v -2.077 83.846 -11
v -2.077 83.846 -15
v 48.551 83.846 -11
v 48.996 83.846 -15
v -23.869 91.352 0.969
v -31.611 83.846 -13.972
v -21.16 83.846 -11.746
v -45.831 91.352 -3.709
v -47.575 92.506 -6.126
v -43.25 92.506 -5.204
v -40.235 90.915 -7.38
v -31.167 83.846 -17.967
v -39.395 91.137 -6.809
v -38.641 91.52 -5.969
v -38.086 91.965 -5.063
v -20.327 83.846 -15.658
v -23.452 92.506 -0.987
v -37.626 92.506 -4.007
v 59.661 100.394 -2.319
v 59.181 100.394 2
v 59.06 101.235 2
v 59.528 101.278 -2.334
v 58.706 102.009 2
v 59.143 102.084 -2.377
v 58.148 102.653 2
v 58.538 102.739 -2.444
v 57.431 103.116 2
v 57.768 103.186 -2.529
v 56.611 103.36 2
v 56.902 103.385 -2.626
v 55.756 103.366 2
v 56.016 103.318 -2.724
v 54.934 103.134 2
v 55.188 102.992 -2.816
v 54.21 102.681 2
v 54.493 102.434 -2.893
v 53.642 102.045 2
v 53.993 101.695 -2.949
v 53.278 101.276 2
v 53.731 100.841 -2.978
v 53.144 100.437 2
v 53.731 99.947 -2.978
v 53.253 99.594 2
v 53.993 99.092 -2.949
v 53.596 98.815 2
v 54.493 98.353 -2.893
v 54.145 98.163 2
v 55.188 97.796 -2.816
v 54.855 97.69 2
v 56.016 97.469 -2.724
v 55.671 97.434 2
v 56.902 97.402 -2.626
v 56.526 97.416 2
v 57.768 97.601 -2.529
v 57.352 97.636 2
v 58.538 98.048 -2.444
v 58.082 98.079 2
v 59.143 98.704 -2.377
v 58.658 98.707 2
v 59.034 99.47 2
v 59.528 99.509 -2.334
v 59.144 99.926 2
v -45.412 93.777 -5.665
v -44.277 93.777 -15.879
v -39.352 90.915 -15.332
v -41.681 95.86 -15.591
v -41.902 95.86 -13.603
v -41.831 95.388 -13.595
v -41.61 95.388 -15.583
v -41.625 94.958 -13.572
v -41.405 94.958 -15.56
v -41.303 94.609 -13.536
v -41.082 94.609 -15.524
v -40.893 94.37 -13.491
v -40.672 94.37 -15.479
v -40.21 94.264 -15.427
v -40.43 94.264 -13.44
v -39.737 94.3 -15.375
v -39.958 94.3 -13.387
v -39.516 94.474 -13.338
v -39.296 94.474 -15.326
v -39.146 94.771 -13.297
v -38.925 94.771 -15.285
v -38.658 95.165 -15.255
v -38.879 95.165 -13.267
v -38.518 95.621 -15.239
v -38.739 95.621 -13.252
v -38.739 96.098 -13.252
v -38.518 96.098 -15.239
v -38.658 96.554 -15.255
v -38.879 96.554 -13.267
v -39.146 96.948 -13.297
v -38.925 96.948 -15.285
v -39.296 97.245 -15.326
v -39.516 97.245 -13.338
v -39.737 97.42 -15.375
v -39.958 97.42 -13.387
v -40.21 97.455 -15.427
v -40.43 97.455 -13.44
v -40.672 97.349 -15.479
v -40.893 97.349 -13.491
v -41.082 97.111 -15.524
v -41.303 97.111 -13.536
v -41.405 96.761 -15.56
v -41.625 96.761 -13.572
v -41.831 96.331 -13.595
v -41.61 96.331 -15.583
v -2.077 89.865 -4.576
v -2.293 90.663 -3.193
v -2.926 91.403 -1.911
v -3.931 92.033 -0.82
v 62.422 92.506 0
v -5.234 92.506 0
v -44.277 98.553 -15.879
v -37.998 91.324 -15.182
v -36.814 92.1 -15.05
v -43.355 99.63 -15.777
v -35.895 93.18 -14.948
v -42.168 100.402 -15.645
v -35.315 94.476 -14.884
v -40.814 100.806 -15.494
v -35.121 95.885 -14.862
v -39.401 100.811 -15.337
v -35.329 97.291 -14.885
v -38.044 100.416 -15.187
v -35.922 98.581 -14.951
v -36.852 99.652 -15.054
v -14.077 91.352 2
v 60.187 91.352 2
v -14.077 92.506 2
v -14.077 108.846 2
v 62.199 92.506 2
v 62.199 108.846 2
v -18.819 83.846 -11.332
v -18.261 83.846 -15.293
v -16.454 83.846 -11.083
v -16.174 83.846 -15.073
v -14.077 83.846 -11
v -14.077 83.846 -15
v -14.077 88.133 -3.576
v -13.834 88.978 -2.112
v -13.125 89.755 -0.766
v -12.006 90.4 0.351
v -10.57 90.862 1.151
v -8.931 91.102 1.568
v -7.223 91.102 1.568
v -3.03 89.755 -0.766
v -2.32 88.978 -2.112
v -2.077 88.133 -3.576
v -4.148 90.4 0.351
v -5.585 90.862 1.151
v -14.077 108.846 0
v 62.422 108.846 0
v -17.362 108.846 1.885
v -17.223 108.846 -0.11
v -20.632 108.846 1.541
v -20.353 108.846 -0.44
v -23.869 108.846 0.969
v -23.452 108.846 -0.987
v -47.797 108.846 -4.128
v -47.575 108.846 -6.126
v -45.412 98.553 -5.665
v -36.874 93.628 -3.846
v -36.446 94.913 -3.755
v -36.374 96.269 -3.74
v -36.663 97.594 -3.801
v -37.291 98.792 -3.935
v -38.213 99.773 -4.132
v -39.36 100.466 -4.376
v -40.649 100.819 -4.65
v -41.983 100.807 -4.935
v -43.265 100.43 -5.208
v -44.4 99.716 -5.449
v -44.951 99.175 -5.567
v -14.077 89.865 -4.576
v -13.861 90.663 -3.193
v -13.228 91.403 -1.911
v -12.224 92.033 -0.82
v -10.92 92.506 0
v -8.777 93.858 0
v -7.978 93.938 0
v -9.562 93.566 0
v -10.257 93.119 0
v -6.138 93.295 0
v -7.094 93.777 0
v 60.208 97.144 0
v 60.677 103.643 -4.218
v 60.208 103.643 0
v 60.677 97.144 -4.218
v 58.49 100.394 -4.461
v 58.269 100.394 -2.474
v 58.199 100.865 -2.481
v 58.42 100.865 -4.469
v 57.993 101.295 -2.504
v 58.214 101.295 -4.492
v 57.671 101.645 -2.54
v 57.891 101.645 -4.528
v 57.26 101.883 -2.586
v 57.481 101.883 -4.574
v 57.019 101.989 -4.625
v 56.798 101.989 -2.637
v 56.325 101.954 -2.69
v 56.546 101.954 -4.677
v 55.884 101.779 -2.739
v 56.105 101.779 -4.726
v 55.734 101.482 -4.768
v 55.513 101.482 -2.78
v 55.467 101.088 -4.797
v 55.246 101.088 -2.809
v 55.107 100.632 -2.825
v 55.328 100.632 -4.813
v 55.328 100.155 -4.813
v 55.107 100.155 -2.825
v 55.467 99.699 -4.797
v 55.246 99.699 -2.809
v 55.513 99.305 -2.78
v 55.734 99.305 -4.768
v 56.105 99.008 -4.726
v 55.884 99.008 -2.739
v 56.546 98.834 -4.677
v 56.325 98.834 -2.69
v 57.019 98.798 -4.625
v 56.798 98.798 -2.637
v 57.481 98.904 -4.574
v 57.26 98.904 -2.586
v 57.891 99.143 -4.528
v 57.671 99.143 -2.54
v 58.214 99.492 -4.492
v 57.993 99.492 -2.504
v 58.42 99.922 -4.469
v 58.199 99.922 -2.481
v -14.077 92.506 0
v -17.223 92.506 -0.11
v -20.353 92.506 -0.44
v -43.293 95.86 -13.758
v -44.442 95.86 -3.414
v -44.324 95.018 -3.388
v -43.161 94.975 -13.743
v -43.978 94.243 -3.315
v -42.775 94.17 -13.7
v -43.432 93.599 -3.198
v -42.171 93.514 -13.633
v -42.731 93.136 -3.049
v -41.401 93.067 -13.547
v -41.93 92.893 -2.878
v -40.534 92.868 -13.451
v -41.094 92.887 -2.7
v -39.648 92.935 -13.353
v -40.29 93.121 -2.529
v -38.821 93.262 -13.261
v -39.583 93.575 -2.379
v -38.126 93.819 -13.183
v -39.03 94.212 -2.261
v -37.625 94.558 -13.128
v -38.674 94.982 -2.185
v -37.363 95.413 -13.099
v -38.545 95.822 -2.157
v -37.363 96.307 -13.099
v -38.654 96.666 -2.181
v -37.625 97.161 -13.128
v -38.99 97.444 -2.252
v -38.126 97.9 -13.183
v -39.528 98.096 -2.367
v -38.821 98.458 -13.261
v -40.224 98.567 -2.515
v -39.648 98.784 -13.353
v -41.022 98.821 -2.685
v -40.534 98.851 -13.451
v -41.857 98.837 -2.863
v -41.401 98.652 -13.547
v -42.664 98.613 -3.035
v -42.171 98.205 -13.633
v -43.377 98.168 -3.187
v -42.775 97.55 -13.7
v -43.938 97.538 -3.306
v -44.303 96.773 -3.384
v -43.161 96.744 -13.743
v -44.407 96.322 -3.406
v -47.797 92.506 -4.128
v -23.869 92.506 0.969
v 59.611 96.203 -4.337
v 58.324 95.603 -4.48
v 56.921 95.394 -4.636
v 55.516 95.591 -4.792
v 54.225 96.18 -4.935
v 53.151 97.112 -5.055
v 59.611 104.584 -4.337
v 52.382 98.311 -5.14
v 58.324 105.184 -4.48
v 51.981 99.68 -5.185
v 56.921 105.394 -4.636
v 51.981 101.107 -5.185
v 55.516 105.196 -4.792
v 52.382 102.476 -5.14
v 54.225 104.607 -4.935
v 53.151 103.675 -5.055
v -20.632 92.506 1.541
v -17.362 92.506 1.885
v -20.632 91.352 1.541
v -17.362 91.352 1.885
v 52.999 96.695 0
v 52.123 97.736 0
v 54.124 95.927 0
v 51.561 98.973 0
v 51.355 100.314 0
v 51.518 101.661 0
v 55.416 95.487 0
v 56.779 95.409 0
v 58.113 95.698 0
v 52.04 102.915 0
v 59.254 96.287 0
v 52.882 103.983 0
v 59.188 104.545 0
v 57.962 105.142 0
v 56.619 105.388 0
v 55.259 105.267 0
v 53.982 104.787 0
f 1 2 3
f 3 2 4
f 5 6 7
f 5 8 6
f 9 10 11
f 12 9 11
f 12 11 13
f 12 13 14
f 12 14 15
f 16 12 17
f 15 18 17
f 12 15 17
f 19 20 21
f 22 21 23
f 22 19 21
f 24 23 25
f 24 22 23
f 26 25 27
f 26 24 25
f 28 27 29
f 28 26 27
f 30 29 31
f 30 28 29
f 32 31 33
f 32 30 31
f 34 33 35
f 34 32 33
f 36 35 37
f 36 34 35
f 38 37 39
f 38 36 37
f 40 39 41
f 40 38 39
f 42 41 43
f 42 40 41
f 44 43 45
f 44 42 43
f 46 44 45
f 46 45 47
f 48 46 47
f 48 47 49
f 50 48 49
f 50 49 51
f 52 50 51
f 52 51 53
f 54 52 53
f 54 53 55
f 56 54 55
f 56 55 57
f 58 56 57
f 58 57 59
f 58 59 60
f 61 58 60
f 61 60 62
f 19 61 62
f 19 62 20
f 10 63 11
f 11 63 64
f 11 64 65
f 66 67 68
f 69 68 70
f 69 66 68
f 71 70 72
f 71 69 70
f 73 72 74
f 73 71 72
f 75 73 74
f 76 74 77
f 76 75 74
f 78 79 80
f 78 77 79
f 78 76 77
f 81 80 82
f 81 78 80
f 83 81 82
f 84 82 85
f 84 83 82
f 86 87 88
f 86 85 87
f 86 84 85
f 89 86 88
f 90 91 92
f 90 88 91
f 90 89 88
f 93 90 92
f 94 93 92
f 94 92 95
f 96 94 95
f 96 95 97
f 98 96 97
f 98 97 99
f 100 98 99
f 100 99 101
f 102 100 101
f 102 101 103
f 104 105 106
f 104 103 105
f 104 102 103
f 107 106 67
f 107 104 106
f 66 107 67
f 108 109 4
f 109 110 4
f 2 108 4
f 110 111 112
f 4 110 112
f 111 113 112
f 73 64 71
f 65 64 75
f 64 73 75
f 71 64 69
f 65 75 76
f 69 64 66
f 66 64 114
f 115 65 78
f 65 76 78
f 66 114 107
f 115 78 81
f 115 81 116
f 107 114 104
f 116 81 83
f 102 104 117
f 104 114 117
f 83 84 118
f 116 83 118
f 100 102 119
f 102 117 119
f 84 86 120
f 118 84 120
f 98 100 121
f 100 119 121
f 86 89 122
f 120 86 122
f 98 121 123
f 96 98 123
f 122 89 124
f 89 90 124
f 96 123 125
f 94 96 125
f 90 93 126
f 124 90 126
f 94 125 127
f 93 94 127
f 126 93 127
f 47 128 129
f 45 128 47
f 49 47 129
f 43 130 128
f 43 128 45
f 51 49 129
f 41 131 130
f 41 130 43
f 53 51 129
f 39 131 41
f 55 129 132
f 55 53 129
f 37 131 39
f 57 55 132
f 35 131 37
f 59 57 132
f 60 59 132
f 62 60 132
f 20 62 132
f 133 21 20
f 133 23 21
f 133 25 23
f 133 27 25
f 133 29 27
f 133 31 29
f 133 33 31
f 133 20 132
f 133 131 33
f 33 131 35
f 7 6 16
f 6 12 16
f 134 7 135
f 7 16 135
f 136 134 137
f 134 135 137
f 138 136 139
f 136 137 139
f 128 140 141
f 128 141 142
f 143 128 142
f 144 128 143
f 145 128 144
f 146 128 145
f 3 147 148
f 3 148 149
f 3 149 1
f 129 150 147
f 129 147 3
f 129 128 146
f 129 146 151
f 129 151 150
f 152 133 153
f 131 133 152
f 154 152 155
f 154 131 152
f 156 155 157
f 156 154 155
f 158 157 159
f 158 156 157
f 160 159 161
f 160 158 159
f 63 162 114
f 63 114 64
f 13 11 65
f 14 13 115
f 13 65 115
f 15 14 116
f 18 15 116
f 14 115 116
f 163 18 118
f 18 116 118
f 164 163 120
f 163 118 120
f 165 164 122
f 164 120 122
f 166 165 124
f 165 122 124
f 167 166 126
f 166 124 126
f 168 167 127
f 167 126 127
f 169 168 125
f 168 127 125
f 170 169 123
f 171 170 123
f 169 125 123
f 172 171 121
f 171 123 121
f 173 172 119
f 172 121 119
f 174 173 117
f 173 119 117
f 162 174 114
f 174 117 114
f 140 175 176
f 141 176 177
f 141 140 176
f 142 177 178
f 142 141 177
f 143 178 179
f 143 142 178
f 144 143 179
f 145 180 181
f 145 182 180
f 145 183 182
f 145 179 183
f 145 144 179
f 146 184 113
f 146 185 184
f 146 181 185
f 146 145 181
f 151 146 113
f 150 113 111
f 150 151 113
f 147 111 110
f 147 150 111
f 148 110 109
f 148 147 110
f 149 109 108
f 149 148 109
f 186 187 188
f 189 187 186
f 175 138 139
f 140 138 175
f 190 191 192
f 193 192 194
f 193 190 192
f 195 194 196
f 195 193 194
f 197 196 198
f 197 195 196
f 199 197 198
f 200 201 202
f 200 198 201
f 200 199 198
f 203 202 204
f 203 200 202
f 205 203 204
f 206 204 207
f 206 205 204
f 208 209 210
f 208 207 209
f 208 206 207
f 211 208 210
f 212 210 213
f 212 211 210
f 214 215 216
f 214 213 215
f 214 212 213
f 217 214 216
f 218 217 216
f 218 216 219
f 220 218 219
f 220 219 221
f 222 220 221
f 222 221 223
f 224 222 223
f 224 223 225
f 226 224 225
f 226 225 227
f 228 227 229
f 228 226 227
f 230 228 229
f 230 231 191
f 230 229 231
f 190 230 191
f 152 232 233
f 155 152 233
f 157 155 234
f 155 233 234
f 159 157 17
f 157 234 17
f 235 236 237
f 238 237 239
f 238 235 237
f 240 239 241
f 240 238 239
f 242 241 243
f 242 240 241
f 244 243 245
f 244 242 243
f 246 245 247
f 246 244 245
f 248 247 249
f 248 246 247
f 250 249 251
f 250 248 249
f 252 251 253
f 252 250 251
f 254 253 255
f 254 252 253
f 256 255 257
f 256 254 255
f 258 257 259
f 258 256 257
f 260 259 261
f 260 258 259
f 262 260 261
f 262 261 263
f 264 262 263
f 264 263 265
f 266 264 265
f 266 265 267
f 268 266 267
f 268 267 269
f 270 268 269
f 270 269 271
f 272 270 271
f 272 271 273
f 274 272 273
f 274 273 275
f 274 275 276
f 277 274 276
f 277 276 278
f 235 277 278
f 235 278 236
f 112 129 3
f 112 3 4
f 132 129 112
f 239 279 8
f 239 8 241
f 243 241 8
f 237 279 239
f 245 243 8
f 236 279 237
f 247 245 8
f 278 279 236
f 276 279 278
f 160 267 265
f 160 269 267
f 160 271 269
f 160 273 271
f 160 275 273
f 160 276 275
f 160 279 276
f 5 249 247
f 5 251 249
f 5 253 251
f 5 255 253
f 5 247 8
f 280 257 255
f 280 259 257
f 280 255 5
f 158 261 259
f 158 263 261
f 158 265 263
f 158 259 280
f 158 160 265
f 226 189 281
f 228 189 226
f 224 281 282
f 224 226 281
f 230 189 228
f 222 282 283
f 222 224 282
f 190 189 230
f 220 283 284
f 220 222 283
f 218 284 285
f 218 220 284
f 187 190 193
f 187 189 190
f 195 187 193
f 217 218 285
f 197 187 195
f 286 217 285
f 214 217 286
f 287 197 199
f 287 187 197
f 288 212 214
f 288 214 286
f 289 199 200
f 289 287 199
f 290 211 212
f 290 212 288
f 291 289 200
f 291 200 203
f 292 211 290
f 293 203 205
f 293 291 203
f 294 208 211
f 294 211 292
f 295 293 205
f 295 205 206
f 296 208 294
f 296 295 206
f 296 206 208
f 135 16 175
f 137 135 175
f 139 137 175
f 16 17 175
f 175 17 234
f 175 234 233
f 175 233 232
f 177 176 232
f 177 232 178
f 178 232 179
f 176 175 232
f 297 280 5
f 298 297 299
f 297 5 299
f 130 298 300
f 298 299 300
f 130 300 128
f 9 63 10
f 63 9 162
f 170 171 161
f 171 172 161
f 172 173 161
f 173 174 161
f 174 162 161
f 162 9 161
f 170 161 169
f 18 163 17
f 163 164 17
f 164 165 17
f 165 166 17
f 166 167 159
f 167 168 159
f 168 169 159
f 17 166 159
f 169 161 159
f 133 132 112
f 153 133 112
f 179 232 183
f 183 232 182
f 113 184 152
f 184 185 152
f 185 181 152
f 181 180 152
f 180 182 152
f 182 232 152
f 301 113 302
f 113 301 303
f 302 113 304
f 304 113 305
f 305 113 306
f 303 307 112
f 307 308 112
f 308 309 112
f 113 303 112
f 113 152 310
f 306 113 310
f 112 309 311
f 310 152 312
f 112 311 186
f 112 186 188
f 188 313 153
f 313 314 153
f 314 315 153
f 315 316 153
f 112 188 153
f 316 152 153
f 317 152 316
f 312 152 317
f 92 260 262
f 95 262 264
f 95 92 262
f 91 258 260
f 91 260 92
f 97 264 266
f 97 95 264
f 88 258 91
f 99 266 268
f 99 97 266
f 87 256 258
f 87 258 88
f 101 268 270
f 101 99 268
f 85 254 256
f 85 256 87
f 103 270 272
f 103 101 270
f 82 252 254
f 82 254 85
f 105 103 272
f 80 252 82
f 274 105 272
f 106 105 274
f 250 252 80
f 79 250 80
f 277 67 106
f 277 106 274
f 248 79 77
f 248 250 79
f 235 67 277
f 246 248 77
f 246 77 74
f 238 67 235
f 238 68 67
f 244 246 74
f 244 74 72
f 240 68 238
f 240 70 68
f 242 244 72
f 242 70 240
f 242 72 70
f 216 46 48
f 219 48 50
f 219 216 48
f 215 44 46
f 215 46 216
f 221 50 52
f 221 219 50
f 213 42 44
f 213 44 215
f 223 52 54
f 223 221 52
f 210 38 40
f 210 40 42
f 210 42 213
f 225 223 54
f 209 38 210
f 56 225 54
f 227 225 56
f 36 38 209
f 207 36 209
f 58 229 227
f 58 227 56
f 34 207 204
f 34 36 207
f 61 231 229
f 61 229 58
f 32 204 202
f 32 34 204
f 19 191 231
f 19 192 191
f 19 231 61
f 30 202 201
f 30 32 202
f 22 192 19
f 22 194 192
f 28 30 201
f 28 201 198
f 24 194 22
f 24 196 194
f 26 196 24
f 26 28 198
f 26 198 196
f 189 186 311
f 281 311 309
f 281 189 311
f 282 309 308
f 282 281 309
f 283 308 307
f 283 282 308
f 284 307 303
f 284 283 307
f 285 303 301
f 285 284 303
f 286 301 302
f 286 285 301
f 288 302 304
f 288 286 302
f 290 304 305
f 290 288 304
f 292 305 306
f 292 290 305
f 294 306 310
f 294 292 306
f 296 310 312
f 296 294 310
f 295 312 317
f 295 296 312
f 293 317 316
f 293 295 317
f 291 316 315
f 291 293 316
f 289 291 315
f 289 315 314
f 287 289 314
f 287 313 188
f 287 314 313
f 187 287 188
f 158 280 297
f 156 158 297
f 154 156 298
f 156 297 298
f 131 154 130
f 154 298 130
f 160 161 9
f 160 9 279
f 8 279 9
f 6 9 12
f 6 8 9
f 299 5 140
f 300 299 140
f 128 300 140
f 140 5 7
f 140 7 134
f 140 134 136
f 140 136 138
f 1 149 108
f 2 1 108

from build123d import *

# Parameters (mm, degrees)
SKETCH1_W           = 76.498745459
SKETCH1_H           = 16.339745962
EXTRUDE1_DEPTH      = 2
SKETCH2_W           = 24.663668615
SKETCH2_H           = 16.339745962
EXTRUDE2_DEPTH      = 2
EXTRUDE3_DEPTH      = 16.339746
EXTRUDE4_DEPTH      = 2
EXTRUDE5_DEPTH      = 2
SKETCH6_W           = 24.021275531
SKETCH6_H           = 33.549299437
CUT_EXTRUDE2_DEPTH  = 5
SKETCH7_W           = 19.882310522
SKETCH7_H           = 22.758948474
CUT_EXTRUDE3_DEPTH  = 5
SKETCH8_W           = 89.248411888
SKETCH8_H           = 36.273905792
CUT_EXTRUDE4_DEPTH  = 5
SKETCH9_W           = 105.763953189
SKETCH9_H           = 17.720813838
CUT_EXTRUDE5_DEPTH  = 5
SKETCH10_W          = 34.758116025
SKETCH10_H          = 9.090411144
CUT_EXTRUDE6_DEPTH  = 5
SKETCH11_W          = 43.05920404
SKETCH11_H          = 32.49855368
CUT_EXTRUDE7_DEPTH  = 5
SKETCH12_W          = 30.563373624
SKETCH12_H          = 19.163652291
CUT_EXTRUDE8_DEPTH  = 5
CUT_EXTRUDE9_DEPTH  = 5
EXTRUDE6_REACH      = 127.538
SKETCH17_R          = 1.6
SKETCH18_R          = 3
CUT_EXTRUDE10_DEPTH = 46


with BuildPart() as part:
    # Sketch1 → Extrude1 (new body)
    with BuildSketch(Plane.XY):
        with Locations((24.172246601, 100.676372122)):
            Rectangle(SKETCH1_W, SKETCH1_H)
    extrude(amount=EXTRUDE1_DEPTH)



with BuildPart() as body_2:
    # Sketch2 → Extrude2 (new body)
    with BuildSketch(Plane(origin=(-0.816696373, 0, 3.834120606), x_dir=(0.9780578191404126, 0, 0.2083336324703724), z_dir=(-0.2083336324703724, -4.010680676458379e-15, 0.9780578191404126))):
        with Locations((-35.47509105, 100.676372122)):
            Rectangle(SKETCH2_W, SKETCH2_H)
    extrude(amount=EXTRUDE2_DEPTH)


with BuildPart() as part_1:
    add(part.part)

    add(body_2.part)  # Extrude3 merges body 2
    # Sketch3 → Extrude3 (add)
    with BuildSketch(Plane.XZ.offset(-92.506499141)):
        with BuildLine():
            Line((-14.077126129, 2), (-14.077126129, 0))
            ThreePointArc((-14.077126129, 0), (-18.790559922, -0.247530326), (-23.45213959, -0.987398139))
            Line((-23.45213959, -0.987398139), (-23.868806855, 0.9687175))
            ThreePointArc((-23.868806855, 0.9687175), (-19.000045868, 1.741468326), (-14.077126129, 2))
        make_face()
    extrude(amount=-EXTRUDE3_DEPTH)

    # Sketch4 → Extrude4 (add)
    with BuildSketch(Plane(origin=(0, 69.379874356, -40.056489136), x_dir=(1, 0, 0), z_dir=(1.6628191878975688e-14, -0.8660254037844406, 0.49999999999999695))):
        Polygon((48.995874099, 28.932741495), (66.339290827, 48.549555392), (-14.077126129, 48.549555392), (-14.077126129, 28.932741495), align=None)
    extrude(amount=EXTRUDE4_DEPTH)

    # Sketch5 → Extrude5 (add)
    with BuildSketch(Plane(origin=(8.140939792, 67.682405259, -38.219032255), x_dir=(0.9945598395247158, -0.09070455643384139, 0.0512192253622747), z_dir=(-0.1041668162351687, -0.866025403784443, 0.4890289095702023))):
        Polygon((-39.522656048, 25.582379856), (-28.623792922, 27.592891937), (-32.348610718, 47.784901585), (-60.160615909, 42.251632984), align=None)
    extrude(amount=EXTRUDE5_DEPTH)

    # Sketch6 → Cut-Extrude2 (cut)
    with BuildSketch(Plane(origin=(-24.396405636, 42.515816182, -2.71052281), x_dir=(0.867783590939769, 0.49593545163938957, -0.031617512598470475), z_dir=(0.4969422897034219, -0.8660254037844308, 0.05521196160555937))):
        with Locations((92.951842282, -1.018457271)):
            Rectangle(SKETCH6_W, SKETCH6_H)
    extrude(amount=CUT_EXTRUDE2_DEPTH, mode=Mode.SUBTRACT)

    # Sketch7 → Cut-Extrude3 (cut)
    with BuildSketch(Plane(origin=(61.660484884, 0, 6.850687483), x_dir=(0.11042392321111931, 2.1241172155137457e-15, -0.9938845794068167), z_dir=(0.9938845794068167, 1.91183874287404e-14, 0.11042392321111931))):
        with Locations((3.336054833, 99.931868434)):
            Rectangle(SKETCH7_W, SKETCH7_H)
    extrude(amount=CUT_EXTRUDE3_DEPTH, mode=Mode.SUBTRACT)

    # Sketch8 → Cut-Extrude4 (cut)
    with BuildSketch(Plane.XZ.offset(-83.846245103)):
        with Locations((7.257561645, -23.336285345)):
            Rectangle(SKETCH8_W, SKETCH8_H)
    extrude(amount=CUT_EXTRUDE4_DEPTH, mode=Mode.SUBTRACT)

    # Sketch9 → Cut-Extrude5 (cut)
    with BuildSketch(Plane.XY.offset(2)):
        with Locations((13.489075652, 93.672145699)):
            Rectangle(SKETCH9_W, SKETCH9_H)
    extrude(amount=CUT_EXTRUDE5_DEPTH, mode=Mode.SUBTRACT)

    # Sketch10 → Cut-Extrude6 (cut)
    with BuildSketch(Plane(origin=(-1.233363638, 0, 5.790236244), x_dir=(0.9780578191404125, 0, 0.2083336324703724), z_dir=(-0.20833363247037243, -4.0496183161323325e-15, 0.9780578191404126))):
        with Locations((-35.327877251, 93.473511189)):
            Rectangle(SKETCH10_W, SKETCH10_H)
    extrude(amount=CUT_EXTRUDE6_DEPTH, mode=Mode.SUBTRACT)

    # Sketch11 → Cut-Extrude7 (cut)
    with BuildSketch(Plane(origin=(-47.66681885, 0, -5.29594407), x_dir=(-0.11042392321111921, -2.1239244818946968e-15, 0.9938845794068167), z_dir=(-0.9938845794068167, -1.9116652705264417e-14, -0.11042392321111921))):
        with Locations((-0.835470819, 96.627603238)):
            Rectangle(SKETCH11_W, SKETCH11_H)
    extrude(amount=CUT_EXTRUDE7_DEPTH, mode=Mode.SUBTRACT)

    # Sketch12 → Cut-Extrude8 (cut)
    with BuildSketch(Plane(origin=(27.894822145, 48.612535322, 3.099208663), x_dir=(0.8677835909397874, -0.4959354516393574, -0.03161751259846775), z_dir=(-0.4969422897033898, -0.8660254037844495, -0.05521196160555938))):
        with Locations((-76.494352482, -16.060277262)):
            Rectangle(SKETCH12_W, SKETCH12_H)
    extrude(amount=CUT_EXTRUDE8_DEPTH, mode=Mode.SUBTRACT)

    # Sweep1: sweep along a curve in space
    with BuildLine() as sweep1_path:
        ThreePointArc((-23.45213959, 92.506499141, -0.987398139), (-18.790559922, 92.506499141, -0.247530326), (-14.077126129, 92.506499141, 0))
    # Sketch15 → Sweep1 (sweep)
    with BuildSketch(Plane(origin=(-22.635443217, 0, -4.821518744), x_dir=(0.2083336324703729, 4.064599859131597e-15, -0.9780578191404125), z_dir=(0.9780578191404125, 1.908195823574488e-14, 0.2083336324703729))):
        Polygon((-5.92013696, 92.506499141), (-5.92013696, 91.351798603), (7.07986304, 83.846245103), (11.07986304, 83.846245103), (-3.92013696, 92.506499141), align=None)
    sweep(path=sweep1_path.line)

    # Sketch16 → Cut-Extrude9 (cut)
    with BuildSketch(Plane(origin=(0, 67.647823548, -39.056489136), x_dir=(1, 0, 0), z_dir=(1.6740836018830237e-14, -0.8660254037844403, 0.4999999999999971))):
        with BuildLine():
            Line((-14.077126129, 24.677772288), (-14.077126129, 40.969683028))
            ThreePointArc((-14.077126129, 40.969683028), (-8.077126129, 46.969683028), (-2.077126129, 40.969683028))
            Line((-2.077126129, 40.969683028), (-2.077126129, 24.677772288))
            ThreePointArc((-2.077126129, 24.677772288), (-8.077126129, 18.677772288), (-14.077126129, 24.677772288))
        make_face()
    extrude(amount=-CUT_EXTRUDE9_DEPTH, mode=Mode.SUBTRACT)

    # Sketch17 → Extrude6 (add, up to next)
    with BuildSketch(Plane(origin=(1.202830139, 0, -10.826225801), x_dir=(0.9938845794068167, 0, 0.11042392321111931), z_dir=(-0.11042392321111931, -2.5465740627339532e-15, 0.9938845794068167)), mode=Mode.PRIVATE) as extrude6_sk1:
        with BuildLine():
            Line((-45.760115126, 98.553158182), (-45.760115126, 93.776669733))
            Line((-45.760115126, 93.776669733), (-40.803979116, 90.915243274))
            ThreePointArc((-40.803979116, 90.915243274), (-37.353292881, 98.581286318), (-45.760115126, 98.553158182))
        make_face()
        with Locations(Location((-41.547644752, 95.859630134, 0), (0, 0, 180))):
            Circle(SKETCH17_R, mode=Mode.SUBTRACT)
    extrude6_tool1 = extrude(extrude6_sk1.sketch, amount=EXTRUDE6_REACH, mode=Mode.PRIVATE) - part_1.part
    # Sketch17 → Extrude6 (add, up to next)
    with BuildSketch(Plane(origin=(1.202830139, 0, -10.826225801), x_dir=(0.9938845794068167, 0, 0.11042392321111931), z_dir=(-0.11042392321111931, -2.5465740627339532e-15, 0.9938845794068167)), mode=Mode.PRIVATE) as extrude6_sk2:
        with BuildLine():
            Line((59.839884874, 103.643328995), (59.839884874, 97.144098271))
            ThreePointArc((59.839884874, 97.144098271), (51.039884874, 100.393713633), (59.839884874, 103.643328995))
        make_face()
        with Locations((56.039884874, 100.393713633)):
            Circle(SKETCH17_R, mode=Mode.SUBTRACT)
    extrude6_tool2 = extrude(extrude6_sk2.sketch, amount=EXTRUDE6_REACH, mode=Mode.PRIVATE) - part_1.part
    add(extrude6_tool1.solids().sort_by_distance((-36.035052, 98.507498, -14.96348))[0])
    add(extrude6_tool2.solids().sort_by_distance((60.544377, 100.393714, -4.23318))[0])

    # Sketch18 → Cut-Extrude10 (cut)
    with BuildSketch(Plane(origin=(0.981982292, 0, -8.838456642), x_dir=(0.9938845794068167, 0, 0.11042392321111931), z_dir=(-0.11042392321111931, -2.5465740627339532e-15, 0.9938845794068167))):
        with Locations(Location((-41.547644752, 95.859630134, 0), (0, 0, 180))):
            Circle(SKETCH18_R)
        with Locations((56.039884874, 100.393713633)):
            Circle(SKETCH18_R)
    extrude(amount=CUT_EXTRUDE10_DEPTH, mode=Mode.SUBTRACT)


solid = part_1.part
